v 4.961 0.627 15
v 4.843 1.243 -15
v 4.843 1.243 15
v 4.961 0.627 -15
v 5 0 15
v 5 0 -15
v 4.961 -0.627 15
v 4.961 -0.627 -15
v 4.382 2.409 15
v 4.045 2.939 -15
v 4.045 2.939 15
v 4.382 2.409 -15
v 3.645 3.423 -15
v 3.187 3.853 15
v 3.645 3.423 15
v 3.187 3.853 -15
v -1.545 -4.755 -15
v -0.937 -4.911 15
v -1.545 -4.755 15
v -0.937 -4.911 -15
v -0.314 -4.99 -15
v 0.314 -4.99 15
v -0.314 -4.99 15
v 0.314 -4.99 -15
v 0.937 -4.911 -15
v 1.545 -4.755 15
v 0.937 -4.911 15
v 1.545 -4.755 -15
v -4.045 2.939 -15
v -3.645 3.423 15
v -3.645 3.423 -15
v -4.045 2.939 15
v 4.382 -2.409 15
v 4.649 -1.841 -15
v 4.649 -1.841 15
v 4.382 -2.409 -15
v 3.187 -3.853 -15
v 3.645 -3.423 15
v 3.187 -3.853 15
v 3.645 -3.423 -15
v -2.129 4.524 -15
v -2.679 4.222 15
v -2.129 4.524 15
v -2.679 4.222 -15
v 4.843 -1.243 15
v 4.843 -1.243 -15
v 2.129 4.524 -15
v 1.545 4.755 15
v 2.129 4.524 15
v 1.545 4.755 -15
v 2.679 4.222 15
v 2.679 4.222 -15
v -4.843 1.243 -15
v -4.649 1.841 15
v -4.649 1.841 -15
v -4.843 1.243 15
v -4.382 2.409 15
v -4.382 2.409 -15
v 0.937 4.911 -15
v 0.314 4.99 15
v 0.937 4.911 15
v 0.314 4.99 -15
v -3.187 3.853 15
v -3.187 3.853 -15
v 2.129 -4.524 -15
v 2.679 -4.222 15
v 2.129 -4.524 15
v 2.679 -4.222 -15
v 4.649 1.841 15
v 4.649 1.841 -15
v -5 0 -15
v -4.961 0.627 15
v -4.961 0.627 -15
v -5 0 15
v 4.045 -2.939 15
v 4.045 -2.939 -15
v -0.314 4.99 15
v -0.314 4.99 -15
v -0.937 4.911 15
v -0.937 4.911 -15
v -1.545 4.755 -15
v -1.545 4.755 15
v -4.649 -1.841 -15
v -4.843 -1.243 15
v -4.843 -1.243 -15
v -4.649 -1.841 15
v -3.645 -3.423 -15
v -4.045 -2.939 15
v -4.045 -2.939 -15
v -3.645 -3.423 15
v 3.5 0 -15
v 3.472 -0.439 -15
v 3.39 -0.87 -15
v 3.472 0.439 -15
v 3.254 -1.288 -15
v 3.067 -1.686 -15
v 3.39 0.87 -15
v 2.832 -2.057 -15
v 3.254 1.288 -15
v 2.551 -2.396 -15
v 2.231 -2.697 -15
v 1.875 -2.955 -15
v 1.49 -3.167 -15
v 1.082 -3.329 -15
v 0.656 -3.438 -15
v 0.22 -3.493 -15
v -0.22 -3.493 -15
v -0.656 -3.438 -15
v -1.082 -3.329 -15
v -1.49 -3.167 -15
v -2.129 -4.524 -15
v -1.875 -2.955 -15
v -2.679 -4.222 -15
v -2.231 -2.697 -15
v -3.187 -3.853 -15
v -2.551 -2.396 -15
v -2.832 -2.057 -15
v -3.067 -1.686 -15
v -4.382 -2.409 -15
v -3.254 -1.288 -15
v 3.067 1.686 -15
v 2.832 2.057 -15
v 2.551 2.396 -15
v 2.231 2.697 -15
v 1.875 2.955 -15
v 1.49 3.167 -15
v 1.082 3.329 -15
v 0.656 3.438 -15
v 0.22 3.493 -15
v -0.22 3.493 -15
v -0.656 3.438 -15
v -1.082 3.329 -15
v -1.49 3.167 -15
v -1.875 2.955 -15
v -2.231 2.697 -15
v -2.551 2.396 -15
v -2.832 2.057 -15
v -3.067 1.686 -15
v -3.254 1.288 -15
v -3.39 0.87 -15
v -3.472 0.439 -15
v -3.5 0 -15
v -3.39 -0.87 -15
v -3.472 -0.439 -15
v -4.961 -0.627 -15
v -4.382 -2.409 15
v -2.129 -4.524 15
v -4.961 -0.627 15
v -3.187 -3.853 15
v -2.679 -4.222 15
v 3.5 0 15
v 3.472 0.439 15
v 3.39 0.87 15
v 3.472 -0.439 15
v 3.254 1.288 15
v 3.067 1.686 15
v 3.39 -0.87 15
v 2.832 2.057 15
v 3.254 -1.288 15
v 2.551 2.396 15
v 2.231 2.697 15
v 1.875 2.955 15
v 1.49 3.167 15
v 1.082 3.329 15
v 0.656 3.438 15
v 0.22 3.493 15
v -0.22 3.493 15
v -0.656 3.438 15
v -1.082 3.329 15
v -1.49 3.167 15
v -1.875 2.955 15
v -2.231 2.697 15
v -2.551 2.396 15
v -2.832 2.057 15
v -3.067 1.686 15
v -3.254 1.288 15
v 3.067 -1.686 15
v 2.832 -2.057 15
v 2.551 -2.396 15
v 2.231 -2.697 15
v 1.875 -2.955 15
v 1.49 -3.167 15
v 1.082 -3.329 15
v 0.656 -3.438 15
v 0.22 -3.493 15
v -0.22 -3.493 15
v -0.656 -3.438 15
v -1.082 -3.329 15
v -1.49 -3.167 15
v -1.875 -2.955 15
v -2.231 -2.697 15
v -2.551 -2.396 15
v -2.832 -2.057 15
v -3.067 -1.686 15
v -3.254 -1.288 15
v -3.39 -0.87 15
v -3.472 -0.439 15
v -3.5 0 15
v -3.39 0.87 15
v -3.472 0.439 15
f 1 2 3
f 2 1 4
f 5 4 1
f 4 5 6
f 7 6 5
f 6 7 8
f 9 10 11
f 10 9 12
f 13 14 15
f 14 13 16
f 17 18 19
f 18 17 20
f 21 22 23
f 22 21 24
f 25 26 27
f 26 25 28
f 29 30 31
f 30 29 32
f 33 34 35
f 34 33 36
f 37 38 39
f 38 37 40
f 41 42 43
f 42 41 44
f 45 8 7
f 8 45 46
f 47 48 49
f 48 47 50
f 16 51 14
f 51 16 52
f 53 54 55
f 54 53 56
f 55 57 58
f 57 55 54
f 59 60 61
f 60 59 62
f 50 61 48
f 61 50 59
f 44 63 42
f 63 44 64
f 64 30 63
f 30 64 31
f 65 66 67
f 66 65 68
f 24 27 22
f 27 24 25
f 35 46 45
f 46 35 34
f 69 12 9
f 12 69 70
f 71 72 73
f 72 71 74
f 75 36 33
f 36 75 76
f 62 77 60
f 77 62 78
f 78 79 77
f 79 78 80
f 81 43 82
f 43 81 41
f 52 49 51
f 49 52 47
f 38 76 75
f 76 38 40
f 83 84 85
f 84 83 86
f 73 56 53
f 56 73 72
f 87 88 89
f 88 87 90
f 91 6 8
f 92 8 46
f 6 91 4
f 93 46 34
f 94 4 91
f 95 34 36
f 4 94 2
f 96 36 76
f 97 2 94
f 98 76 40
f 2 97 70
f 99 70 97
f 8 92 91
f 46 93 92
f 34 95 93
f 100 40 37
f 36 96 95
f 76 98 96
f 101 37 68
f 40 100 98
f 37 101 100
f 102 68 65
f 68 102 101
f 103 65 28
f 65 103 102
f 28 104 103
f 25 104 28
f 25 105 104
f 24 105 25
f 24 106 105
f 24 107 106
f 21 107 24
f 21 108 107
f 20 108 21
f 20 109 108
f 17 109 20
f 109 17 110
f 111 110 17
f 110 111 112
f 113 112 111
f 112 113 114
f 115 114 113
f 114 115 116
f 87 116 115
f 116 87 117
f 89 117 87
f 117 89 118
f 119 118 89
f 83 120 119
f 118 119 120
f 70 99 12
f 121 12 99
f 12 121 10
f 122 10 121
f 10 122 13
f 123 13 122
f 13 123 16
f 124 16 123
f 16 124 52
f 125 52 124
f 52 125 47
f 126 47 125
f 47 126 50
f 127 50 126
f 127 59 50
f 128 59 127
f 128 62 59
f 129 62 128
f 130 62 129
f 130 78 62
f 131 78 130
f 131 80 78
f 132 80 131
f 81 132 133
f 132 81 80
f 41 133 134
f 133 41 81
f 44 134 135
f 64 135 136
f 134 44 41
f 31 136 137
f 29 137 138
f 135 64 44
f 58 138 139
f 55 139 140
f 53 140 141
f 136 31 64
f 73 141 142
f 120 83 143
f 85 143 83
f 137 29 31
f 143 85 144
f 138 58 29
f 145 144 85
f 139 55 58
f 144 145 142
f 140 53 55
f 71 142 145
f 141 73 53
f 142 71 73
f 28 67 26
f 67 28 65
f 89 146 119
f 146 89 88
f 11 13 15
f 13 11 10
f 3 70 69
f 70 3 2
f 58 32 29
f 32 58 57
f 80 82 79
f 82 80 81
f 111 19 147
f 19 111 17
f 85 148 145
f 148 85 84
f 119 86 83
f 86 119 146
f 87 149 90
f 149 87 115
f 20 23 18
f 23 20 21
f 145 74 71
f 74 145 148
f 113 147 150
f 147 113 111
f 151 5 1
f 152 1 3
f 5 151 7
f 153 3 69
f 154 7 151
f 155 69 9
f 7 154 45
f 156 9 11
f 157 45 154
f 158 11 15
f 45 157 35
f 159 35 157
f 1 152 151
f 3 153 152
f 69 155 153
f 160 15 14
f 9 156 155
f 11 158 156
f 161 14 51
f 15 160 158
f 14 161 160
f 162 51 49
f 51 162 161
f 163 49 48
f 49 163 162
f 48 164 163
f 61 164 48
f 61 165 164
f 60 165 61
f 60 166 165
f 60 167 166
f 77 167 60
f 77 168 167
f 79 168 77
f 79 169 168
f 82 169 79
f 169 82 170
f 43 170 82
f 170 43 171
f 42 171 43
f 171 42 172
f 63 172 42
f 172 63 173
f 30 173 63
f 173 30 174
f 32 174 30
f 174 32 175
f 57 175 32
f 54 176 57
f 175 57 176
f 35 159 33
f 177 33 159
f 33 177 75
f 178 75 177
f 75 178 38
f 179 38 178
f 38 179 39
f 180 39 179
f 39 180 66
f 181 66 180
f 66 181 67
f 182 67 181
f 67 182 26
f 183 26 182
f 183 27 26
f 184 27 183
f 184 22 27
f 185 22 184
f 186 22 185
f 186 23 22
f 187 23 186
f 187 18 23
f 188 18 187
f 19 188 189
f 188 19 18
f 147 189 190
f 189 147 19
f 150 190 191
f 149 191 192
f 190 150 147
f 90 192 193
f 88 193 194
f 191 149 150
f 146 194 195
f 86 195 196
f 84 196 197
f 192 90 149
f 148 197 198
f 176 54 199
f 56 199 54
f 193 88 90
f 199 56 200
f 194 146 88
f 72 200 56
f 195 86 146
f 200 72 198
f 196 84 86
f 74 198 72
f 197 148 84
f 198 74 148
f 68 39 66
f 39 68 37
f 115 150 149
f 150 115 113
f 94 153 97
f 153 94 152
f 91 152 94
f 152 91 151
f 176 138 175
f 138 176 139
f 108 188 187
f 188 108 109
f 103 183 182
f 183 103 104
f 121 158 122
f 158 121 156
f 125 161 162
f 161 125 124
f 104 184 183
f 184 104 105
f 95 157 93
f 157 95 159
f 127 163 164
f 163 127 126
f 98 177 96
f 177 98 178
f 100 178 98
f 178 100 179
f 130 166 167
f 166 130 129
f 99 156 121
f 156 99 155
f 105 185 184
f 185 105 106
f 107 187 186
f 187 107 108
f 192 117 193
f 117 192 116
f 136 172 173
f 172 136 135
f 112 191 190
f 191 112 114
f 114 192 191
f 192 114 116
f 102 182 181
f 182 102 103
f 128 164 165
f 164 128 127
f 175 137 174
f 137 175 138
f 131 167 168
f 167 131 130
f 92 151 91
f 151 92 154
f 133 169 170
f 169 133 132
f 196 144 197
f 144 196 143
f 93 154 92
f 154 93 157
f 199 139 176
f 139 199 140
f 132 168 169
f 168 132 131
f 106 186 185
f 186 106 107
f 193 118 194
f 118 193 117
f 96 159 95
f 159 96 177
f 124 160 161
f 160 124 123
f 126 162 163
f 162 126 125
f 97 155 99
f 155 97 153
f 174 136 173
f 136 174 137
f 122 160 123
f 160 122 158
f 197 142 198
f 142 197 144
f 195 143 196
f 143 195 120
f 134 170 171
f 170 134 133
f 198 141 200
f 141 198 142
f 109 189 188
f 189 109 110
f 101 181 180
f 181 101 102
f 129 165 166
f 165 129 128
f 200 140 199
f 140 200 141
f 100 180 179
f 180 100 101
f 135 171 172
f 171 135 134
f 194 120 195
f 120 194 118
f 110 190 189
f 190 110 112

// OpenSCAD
$fn = 50;


difference() {
	union() {
		translate(v = [0, 0, -15.0000000000]) {
			cylinder(h = 30, r = 5.0000000000);
		}
	}
	union() {
		translate(v = [0, 0, -100.0000000000]) {
			cylinder(h = 200, r = 3.5000000000);
		}
	}
}
